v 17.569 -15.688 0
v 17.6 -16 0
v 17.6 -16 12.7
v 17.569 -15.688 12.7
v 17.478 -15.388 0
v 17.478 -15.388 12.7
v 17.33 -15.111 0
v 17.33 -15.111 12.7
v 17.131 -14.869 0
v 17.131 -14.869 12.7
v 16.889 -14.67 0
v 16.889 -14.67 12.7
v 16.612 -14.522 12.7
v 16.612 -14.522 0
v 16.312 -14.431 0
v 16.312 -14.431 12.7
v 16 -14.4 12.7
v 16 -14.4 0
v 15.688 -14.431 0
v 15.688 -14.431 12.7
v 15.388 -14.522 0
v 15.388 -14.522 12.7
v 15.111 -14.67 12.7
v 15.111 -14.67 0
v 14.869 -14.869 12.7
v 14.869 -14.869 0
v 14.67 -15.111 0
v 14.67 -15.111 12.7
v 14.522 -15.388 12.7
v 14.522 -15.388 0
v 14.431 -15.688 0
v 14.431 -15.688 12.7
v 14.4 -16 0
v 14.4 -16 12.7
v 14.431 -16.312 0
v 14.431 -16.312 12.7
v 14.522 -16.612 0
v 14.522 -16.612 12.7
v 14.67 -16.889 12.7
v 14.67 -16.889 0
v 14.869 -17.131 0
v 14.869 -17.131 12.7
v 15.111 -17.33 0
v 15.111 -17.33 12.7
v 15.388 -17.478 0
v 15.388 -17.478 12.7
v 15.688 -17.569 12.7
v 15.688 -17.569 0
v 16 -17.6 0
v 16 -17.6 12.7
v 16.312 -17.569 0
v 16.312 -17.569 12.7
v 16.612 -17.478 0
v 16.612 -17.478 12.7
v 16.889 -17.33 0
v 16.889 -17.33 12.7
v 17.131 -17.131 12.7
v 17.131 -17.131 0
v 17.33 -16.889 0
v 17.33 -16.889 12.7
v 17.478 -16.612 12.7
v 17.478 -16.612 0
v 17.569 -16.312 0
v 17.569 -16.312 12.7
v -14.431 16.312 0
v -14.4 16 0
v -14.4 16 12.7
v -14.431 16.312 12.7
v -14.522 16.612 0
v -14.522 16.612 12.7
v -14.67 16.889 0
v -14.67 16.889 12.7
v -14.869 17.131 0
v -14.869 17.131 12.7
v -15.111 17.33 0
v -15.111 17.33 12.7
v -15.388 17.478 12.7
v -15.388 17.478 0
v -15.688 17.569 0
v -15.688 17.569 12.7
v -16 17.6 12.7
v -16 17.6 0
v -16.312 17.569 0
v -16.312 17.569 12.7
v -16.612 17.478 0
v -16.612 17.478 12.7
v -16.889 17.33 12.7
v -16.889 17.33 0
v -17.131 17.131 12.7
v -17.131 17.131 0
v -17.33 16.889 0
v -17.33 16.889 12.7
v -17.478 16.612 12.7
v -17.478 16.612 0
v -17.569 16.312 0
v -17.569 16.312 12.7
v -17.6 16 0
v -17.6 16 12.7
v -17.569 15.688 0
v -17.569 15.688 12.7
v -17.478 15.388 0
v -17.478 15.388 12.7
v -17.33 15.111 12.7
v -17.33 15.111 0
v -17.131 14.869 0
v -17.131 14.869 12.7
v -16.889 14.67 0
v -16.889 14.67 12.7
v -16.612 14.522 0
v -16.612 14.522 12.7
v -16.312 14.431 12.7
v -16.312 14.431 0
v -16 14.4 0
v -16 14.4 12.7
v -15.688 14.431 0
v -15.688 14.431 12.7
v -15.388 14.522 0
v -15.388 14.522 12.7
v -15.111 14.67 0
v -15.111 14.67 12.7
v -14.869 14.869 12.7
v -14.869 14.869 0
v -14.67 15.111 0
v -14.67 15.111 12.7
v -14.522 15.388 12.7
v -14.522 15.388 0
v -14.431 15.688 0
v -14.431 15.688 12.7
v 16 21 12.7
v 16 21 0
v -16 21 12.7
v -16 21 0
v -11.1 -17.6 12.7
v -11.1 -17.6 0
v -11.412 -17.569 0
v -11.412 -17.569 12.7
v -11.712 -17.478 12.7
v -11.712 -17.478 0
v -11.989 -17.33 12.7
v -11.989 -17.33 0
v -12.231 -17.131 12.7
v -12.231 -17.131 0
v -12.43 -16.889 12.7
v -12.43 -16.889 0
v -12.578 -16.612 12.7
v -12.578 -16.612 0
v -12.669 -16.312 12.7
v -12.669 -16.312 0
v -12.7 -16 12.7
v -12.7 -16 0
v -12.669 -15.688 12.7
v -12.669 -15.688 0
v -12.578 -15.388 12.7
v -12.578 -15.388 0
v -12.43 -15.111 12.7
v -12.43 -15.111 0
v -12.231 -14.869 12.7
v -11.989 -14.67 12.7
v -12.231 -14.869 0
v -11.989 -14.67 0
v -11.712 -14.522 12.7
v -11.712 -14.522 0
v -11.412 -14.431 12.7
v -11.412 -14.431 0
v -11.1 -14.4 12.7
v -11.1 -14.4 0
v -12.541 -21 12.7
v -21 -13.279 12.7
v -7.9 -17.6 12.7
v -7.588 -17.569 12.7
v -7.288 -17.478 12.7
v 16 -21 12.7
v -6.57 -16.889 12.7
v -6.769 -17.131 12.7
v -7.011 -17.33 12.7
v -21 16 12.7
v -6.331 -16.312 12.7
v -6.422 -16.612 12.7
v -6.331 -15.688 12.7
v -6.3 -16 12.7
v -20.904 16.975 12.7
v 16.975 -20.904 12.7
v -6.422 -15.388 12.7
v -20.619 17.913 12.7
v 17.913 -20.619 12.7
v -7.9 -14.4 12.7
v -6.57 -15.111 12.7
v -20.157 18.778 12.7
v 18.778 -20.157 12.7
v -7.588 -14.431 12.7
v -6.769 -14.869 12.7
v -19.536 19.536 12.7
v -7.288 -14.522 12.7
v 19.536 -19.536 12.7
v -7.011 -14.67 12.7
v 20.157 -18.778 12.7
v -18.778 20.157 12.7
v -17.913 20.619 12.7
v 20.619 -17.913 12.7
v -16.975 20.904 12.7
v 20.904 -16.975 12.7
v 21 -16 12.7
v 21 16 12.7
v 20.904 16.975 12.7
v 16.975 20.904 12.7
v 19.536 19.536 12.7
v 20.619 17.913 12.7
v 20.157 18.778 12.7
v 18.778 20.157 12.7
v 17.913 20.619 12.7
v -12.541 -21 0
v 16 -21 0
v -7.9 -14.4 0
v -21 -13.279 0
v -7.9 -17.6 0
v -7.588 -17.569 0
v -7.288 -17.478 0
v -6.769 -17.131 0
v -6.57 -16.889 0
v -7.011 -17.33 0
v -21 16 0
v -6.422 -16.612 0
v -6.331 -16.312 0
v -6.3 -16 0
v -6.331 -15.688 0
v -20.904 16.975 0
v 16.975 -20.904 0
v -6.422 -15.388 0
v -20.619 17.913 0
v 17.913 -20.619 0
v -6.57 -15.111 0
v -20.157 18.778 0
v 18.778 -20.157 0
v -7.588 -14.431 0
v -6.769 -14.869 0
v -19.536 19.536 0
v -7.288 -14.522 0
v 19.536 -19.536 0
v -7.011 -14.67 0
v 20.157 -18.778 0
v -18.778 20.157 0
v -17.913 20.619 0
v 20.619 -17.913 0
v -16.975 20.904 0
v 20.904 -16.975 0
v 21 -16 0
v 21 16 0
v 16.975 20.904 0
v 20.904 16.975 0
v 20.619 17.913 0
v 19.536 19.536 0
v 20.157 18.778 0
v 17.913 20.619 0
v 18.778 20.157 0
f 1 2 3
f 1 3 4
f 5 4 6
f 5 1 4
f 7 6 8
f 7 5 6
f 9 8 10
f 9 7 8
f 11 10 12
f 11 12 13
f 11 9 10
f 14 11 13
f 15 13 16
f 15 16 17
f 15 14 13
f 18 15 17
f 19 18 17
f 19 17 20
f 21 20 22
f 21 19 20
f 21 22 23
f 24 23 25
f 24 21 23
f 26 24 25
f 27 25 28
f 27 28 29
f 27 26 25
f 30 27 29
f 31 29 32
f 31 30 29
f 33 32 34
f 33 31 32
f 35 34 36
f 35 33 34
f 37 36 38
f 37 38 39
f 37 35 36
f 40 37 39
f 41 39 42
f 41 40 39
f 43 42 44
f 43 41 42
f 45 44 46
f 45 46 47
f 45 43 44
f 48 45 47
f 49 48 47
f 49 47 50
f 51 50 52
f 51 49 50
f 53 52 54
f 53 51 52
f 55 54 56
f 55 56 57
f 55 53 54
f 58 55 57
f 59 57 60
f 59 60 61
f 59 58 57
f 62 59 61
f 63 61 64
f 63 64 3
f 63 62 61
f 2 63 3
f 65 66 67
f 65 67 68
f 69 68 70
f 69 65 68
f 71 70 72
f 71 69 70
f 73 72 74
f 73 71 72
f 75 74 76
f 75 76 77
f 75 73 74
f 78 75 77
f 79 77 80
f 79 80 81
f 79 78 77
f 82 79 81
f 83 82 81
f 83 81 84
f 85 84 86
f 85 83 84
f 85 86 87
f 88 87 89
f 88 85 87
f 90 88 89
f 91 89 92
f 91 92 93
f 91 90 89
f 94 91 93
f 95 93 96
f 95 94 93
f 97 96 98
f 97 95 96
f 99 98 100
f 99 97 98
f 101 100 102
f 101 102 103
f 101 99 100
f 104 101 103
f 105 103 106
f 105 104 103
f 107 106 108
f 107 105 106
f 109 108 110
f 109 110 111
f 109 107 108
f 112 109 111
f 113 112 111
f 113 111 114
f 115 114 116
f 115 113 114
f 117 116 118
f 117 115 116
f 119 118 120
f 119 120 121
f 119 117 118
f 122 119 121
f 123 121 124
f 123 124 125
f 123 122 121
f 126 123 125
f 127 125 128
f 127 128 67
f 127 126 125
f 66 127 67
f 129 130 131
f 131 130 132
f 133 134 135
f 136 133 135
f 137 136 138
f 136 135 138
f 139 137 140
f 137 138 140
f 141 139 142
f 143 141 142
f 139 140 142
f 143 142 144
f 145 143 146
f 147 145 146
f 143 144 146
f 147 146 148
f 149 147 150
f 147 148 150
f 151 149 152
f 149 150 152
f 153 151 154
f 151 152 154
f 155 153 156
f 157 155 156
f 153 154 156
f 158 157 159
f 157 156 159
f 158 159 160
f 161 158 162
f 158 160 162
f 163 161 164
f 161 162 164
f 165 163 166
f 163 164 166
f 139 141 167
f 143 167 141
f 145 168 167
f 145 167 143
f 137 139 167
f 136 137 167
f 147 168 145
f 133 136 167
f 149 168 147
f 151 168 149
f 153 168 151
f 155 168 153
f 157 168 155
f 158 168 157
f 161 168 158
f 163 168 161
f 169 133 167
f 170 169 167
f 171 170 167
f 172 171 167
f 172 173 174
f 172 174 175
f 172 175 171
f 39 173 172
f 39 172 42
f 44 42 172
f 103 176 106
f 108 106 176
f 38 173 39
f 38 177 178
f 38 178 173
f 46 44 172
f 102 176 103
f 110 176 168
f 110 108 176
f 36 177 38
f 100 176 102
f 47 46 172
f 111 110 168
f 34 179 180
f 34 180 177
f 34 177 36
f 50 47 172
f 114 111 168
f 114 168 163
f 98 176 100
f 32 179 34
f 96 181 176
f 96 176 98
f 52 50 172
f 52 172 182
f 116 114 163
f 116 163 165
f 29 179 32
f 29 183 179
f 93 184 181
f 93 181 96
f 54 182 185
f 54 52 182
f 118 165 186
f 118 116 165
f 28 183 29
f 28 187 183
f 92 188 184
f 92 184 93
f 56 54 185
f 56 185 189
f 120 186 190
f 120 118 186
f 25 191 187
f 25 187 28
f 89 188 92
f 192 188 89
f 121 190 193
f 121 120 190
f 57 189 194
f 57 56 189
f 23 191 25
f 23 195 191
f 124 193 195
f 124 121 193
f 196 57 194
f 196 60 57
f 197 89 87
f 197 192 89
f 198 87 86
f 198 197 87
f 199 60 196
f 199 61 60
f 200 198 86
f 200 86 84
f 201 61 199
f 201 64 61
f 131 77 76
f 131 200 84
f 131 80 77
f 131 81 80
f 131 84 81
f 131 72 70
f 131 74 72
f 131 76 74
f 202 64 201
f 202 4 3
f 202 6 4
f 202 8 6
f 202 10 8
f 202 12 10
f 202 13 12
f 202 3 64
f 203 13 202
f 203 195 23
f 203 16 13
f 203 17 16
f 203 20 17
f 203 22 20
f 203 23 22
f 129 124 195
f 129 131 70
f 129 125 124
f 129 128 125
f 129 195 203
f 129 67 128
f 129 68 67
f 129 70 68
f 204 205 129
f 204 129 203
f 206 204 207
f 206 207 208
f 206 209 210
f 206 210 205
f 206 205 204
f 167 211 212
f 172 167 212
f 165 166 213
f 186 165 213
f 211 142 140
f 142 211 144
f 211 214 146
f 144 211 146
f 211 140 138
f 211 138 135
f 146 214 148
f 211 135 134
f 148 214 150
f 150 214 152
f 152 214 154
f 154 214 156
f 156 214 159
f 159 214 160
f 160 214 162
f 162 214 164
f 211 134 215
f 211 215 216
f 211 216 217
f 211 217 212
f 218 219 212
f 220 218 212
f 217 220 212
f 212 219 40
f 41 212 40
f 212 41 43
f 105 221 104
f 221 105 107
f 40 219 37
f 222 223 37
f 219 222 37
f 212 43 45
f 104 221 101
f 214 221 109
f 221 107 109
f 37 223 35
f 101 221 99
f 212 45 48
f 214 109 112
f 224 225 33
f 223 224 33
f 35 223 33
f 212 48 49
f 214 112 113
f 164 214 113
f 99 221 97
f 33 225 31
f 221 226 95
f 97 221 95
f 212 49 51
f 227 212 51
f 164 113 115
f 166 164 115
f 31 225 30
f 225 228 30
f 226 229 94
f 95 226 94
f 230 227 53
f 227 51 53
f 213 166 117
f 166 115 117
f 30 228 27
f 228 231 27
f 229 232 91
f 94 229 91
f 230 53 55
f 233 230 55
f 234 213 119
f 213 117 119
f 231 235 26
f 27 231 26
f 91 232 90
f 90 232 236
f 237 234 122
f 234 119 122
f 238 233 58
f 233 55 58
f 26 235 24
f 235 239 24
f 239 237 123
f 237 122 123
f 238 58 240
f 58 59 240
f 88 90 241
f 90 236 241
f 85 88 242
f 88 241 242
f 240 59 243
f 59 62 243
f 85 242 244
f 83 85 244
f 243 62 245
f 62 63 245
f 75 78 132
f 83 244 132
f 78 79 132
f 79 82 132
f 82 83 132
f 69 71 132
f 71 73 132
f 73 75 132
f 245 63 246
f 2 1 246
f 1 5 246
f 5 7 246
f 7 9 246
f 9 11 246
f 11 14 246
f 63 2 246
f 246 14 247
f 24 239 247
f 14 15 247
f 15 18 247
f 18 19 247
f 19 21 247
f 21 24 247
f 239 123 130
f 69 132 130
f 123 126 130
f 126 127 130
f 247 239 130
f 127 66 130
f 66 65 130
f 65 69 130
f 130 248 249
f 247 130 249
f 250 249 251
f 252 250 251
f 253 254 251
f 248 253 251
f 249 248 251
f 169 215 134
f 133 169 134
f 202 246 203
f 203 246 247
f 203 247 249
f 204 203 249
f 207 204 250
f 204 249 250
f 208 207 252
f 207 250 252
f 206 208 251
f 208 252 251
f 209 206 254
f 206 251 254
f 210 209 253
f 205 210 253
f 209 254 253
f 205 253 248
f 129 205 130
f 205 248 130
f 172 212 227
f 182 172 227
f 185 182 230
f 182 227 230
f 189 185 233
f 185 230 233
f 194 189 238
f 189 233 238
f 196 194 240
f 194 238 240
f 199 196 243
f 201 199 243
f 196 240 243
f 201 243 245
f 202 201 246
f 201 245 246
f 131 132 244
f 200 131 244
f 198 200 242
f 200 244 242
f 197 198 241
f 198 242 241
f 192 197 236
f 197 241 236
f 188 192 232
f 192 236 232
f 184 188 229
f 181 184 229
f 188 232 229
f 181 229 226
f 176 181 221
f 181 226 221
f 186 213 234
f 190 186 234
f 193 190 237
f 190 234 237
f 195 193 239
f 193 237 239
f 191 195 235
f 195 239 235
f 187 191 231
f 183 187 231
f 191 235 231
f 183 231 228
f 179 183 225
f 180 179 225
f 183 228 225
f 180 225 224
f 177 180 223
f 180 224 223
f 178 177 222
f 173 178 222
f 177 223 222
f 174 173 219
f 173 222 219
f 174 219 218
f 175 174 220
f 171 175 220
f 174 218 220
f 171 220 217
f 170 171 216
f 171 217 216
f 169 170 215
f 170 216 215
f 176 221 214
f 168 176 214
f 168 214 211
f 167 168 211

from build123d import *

# Parameters (mm, degrees)
F0_R     = 1.6
F1_DEPTH = 12.7


with BuildPart() as f1:
    # F0 (on Top) → F1 (new body)
    with BuildSketch(Plane.XY):
        with BuildLine():
            ThreePointArc((21, 16), (19.535534, 19.535534), (16, 21))
            Line((16, 21), (-16, 21))
            ThreePointArc((-16, 21), (-19.535534, 19.535534), (-21, 16))
            Line((-21, 16), (-21, -13.278688))
            Line((-21, -13.278688), (-12.540984, -21))
            Line((-12.540984, -21), (16, -21))
            ThreePointArc((16, -21), (19.535534, -19.535534), (21, -16))
            Line((21, -16), (21, 16))
        make_face()
        with BuildLine():
            ThreePointArc((-11.1, -17.6), (-12.7, -16), (-11.1, -14.4))
            Line((-11.1, -14.4), (-7.9, -14.4))
            ThreePointArc((-7.9, -14.4), (-6.3, -16), (-7.9, -17.6))
            Line((-7.9, -17.6), (-11.1, -17.6))
        make_face(mode=Mode.SUBTRACT)
        with Locations((16, -16)):
            Circle(F0_R, mode=Mode.SUBTRACT)
        with Locations((-16, 16)):
            Circle(F0_R, mode=Mode.SUBTRACT)
    extrude(amount=F1_DEPTH)


solid = f1.part
